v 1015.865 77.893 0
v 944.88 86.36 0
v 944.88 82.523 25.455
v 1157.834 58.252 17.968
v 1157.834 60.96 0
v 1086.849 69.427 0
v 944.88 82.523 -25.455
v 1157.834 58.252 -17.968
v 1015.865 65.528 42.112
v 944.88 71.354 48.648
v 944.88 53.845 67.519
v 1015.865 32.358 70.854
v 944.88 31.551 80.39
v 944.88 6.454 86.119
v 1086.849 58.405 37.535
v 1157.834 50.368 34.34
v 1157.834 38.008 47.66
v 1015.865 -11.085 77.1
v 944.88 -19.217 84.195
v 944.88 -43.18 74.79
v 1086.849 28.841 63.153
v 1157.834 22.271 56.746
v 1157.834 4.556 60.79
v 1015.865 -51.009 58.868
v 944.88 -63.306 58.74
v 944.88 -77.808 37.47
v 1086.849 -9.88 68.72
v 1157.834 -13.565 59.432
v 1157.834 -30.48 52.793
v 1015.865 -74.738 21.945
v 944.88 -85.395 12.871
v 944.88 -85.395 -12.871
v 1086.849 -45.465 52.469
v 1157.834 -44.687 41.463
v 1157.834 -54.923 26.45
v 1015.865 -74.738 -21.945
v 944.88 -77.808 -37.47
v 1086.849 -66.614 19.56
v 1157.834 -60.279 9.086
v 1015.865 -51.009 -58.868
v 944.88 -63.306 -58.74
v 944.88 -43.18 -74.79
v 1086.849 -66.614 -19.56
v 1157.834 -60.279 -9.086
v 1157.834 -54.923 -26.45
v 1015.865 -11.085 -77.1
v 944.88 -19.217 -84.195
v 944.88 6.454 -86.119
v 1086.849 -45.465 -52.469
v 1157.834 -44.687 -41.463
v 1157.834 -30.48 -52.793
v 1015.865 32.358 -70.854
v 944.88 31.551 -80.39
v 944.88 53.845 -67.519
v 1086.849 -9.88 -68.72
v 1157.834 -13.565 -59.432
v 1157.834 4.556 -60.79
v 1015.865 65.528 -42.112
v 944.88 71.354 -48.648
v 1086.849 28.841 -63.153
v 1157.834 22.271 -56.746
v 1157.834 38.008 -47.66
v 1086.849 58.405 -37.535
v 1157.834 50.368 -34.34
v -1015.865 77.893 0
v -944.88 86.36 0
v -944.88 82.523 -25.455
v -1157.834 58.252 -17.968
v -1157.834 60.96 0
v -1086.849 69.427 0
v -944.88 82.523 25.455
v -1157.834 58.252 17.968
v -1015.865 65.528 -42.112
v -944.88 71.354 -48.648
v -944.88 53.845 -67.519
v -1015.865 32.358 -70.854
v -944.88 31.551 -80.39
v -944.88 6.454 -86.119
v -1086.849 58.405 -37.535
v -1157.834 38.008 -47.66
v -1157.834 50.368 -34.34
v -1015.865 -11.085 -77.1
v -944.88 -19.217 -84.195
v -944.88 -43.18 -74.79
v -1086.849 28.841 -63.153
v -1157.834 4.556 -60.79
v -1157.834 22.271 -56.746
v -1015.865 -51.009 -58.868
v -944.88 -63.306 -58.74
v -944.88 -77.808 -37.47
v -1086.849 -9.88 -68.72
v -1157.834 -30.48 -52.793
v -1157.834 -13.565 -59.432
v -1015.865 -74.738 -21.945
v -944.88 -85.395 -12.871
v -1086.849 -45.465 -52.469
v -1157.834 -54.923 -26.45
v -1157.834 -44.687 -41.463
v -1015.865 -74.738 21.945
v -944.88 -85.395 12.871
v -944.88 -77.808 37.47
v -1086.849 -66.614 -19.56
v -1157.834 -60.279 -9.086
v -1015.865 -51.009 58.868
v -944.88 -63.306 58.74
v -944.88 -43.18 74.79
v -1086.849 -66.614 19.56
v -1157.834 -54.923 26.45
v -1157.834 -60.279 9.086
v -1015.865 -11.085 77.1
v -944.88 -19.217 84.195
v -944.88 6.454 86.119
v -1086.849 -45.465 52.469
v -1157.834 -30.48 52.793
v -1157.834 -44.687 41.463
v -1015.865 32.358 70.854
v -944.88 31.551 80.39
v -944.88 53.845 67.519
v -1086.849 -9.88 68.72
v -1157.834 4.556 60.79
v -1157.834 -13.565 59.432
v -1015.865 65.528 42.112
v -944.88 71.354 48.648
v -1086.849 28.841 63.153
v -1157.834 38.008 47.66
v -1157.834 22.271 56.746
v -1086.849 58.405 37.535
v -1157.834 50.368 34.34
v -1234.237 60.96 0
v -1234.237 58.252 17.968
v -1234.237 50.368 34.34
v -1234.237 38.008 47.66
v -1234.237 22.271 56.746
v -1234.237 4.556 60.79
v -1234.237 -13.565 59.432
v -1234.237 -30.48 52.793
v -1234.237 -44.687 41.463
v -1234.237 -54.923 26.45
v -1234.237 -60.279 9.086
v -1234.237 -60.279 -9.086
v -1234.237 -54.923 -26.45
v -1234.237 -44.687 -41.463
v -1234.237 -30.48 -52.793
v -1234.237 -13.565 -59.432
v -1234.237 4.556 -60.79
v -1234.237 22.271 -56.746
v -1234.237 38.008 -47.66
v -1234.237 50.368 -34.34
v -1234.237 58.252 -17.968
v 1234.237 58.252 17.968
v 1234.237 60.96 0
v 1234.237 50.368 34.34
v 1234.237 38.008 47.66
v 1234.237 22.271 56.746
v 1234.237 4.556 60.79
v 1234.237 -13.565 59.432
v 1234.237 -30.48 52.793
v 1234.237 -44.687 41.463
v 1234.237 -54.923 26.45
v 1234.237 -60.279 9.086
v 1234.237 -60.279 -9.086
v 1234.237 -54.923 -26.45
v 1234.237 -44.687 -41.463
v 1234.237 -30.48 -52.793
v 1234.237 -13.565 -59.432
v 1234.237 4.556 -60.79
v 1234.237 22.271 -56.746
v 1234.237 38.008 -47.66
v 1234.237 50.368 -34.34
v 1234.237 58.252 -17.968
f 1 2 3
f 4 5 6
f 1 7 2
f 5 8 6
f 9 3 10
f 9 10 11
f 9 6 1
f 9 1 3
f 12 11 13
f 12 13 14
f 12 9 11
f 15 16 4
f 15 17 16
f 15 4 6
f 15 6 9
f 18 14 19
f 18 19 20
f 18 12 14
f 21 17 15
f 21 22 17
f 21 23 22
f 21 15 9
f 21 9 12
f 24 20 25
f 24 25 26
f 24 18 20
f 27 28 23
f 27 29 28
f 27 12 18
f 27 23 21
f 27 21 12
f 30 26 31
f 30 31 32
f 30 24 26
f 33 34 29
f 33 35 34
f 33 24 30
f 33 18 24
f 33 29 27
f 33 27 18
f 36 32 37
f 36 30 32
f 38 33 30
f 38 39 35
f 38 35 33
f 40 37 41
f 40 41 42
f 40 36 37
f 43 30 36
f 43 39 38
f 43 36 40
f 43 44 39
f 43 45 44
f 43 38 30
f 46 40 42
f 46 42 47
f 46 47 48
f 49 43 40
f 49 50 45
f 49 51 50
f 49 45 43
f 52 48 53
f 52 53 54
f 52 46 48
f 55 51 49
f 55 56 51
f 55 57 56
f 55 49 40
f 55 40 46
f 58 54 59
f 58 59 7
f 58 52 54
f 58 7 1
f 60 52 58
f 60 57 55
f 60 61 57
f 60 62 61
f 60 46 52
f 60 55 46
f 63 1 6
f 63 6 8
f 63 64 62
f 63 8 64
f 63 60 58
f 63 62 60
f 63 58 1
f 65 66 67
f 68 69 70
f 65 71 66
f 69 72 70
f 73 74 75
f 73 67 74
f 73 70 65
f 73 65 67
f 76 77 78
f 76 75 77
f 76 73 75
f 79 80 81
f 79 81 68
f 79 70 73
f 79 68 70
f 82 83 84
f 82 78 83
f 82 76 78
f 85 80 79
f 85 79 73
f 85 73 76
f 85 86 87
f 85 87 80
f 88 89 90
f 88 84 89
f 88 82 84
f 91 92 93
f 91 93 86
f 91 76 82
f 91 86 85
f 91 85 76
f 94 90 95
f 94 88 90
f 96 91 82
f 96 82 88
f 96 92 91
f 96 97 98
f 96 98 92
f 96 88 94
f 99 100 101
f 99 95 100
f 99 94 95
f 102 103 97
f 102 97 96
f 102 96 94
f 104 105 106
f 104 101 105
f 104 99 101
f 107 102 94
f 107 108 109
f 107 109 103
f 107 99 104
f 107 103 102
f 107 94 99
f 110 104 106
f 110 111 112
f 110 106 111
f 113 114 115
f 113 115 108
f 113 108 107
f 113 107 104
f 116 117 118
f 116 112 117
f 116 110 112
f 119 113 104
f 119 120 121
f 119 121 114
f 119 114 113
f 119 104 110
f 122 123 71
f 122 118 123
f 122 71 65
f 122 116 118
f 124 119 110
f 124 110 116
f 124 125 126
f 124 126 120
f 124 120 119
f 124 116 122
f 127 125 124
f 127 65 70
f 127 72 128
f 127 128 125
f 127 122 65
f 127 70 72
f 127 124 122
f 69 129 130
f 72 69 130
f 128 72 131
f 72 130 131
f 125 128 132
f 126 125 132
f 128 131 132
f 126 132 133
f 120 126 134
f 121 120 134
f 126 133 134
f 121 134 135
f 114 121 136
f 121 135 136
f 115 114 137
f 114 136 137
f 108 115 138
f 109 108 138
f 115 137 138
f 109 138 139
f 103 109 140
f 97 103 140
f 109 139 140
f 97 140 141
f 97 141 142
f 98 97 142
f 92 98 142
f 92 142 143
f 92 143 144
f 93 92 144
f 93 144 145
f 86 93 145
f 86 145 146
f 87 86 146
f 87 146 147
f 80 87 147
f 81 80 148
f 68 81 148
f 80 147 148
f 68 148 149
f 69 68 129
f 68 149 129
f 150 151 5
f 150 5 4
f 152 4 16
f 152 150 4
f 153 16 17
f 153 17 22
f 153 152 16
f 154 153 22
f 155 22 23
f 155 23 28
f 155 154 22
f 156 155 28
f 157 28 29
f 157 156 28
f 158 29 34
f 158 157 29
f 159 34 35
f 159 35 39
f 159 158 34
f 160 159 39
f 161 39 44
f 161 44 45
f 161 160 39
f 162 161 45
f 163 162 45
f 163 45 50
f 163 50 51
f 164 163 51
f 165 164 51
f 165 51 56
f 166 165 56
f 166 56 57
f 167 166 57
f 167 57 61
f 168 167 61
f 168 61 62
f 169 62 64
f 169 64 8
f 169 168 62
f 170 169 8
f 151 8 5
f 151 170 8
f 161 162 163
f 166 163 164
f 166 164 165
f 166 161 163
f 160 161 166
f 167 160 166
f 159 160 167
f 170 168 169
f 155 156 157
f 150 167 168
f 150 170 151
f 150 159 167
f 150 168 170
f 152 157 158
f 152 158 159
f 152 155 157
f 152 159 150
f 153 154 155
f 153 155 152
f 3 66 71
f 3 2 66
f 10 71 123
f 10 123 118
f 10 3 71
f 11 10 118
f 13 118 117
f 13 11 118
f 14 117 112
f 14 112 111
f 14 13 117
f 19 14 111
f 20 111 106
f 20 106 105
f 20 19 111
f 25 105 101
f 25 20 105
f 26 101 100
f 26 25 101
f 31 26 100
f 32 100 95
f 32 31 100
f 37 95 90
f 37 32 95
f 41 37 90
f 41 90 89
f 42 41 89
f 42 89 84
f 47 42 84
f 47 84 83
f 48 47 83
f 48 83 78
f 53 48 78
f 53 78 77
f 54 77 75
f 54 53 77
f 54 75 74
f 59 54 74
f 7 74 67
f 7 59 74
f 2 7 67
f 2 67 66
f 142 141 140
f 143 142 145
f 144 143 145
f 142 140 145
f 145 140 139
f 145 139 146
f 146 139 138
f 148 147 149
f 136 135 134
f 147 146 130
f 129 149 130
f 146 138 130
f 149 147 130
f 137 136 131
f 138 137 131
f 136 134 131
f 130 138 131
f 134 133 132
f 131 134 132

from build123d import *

# Parameters (mm, degrees)
F0_R       = 53.975
F1_DEPTH   = 590.55
F3_R       = 38.1
F4_DEPTH   = 47.752
F1_FACE_R  = 53.975
F4_FACE_R  = 38.1
F1_FACE1_R = 53.975
F5_FACE_R  = 38.1
F8_SCALE   = 1.6


with BuildPart() as f1:
    # F0 (on Right) → F1 (new body, symmetric)
    with BuildSketch(Plane.YZ):
        Circle(F0_R)
    extrude(amount=F1_DEPTH, both=True)



with BuildPart() as f4:
    # F3 (on offset) → F4 (new body)
    with BuildSketch(Plane.YZ.offset(771.398)):
        Circle(F3_R)
    extrude(amount=-F4_DEPTH)


with BuildPart() as f5_1:
    # F5: instance of F4
    add(f4.part.mirror(Plane.YZ))


with BuildPart() as f1_1:
    add(f1.part)

    add(f4.part)  # F6 merges F4
    # F1_face (on face) → F6 section 0
    with BuildSketch(Plane.YZ.offset(590.55)):
        Circle(F1_FACE_R)
    # F4_face (on face) → F6 section 1
    with BuildSketch(Plane(origin=(723.646, 0, 0), x_dir=(0, 1, 0), z_dir=(-1, 0, 0))):
        Circle(F4_FACE_R)
    loft()


    add(f5_1.part)  # F7 merges F5_1
    # F1_face1 (on face) → F7 section 0
    with BuildSketch(Plane(origin=(-590.55, 0, 0), x_dir=(0, 1, 0), z_dir=(-1, 0, 0))):
        Circle(F1_FACE1_R)
    # F5_face (on face) → F7 section 1
    with BuildSketch(Plane.YZ.offset(-723.646)):
        Circle(F5_FACE_R)
    loft()


with BuildPart() as f1_2:
    # F8: moved
    add(f1_1.part.scale(F8_SCALE))


solid = f1_2.part
